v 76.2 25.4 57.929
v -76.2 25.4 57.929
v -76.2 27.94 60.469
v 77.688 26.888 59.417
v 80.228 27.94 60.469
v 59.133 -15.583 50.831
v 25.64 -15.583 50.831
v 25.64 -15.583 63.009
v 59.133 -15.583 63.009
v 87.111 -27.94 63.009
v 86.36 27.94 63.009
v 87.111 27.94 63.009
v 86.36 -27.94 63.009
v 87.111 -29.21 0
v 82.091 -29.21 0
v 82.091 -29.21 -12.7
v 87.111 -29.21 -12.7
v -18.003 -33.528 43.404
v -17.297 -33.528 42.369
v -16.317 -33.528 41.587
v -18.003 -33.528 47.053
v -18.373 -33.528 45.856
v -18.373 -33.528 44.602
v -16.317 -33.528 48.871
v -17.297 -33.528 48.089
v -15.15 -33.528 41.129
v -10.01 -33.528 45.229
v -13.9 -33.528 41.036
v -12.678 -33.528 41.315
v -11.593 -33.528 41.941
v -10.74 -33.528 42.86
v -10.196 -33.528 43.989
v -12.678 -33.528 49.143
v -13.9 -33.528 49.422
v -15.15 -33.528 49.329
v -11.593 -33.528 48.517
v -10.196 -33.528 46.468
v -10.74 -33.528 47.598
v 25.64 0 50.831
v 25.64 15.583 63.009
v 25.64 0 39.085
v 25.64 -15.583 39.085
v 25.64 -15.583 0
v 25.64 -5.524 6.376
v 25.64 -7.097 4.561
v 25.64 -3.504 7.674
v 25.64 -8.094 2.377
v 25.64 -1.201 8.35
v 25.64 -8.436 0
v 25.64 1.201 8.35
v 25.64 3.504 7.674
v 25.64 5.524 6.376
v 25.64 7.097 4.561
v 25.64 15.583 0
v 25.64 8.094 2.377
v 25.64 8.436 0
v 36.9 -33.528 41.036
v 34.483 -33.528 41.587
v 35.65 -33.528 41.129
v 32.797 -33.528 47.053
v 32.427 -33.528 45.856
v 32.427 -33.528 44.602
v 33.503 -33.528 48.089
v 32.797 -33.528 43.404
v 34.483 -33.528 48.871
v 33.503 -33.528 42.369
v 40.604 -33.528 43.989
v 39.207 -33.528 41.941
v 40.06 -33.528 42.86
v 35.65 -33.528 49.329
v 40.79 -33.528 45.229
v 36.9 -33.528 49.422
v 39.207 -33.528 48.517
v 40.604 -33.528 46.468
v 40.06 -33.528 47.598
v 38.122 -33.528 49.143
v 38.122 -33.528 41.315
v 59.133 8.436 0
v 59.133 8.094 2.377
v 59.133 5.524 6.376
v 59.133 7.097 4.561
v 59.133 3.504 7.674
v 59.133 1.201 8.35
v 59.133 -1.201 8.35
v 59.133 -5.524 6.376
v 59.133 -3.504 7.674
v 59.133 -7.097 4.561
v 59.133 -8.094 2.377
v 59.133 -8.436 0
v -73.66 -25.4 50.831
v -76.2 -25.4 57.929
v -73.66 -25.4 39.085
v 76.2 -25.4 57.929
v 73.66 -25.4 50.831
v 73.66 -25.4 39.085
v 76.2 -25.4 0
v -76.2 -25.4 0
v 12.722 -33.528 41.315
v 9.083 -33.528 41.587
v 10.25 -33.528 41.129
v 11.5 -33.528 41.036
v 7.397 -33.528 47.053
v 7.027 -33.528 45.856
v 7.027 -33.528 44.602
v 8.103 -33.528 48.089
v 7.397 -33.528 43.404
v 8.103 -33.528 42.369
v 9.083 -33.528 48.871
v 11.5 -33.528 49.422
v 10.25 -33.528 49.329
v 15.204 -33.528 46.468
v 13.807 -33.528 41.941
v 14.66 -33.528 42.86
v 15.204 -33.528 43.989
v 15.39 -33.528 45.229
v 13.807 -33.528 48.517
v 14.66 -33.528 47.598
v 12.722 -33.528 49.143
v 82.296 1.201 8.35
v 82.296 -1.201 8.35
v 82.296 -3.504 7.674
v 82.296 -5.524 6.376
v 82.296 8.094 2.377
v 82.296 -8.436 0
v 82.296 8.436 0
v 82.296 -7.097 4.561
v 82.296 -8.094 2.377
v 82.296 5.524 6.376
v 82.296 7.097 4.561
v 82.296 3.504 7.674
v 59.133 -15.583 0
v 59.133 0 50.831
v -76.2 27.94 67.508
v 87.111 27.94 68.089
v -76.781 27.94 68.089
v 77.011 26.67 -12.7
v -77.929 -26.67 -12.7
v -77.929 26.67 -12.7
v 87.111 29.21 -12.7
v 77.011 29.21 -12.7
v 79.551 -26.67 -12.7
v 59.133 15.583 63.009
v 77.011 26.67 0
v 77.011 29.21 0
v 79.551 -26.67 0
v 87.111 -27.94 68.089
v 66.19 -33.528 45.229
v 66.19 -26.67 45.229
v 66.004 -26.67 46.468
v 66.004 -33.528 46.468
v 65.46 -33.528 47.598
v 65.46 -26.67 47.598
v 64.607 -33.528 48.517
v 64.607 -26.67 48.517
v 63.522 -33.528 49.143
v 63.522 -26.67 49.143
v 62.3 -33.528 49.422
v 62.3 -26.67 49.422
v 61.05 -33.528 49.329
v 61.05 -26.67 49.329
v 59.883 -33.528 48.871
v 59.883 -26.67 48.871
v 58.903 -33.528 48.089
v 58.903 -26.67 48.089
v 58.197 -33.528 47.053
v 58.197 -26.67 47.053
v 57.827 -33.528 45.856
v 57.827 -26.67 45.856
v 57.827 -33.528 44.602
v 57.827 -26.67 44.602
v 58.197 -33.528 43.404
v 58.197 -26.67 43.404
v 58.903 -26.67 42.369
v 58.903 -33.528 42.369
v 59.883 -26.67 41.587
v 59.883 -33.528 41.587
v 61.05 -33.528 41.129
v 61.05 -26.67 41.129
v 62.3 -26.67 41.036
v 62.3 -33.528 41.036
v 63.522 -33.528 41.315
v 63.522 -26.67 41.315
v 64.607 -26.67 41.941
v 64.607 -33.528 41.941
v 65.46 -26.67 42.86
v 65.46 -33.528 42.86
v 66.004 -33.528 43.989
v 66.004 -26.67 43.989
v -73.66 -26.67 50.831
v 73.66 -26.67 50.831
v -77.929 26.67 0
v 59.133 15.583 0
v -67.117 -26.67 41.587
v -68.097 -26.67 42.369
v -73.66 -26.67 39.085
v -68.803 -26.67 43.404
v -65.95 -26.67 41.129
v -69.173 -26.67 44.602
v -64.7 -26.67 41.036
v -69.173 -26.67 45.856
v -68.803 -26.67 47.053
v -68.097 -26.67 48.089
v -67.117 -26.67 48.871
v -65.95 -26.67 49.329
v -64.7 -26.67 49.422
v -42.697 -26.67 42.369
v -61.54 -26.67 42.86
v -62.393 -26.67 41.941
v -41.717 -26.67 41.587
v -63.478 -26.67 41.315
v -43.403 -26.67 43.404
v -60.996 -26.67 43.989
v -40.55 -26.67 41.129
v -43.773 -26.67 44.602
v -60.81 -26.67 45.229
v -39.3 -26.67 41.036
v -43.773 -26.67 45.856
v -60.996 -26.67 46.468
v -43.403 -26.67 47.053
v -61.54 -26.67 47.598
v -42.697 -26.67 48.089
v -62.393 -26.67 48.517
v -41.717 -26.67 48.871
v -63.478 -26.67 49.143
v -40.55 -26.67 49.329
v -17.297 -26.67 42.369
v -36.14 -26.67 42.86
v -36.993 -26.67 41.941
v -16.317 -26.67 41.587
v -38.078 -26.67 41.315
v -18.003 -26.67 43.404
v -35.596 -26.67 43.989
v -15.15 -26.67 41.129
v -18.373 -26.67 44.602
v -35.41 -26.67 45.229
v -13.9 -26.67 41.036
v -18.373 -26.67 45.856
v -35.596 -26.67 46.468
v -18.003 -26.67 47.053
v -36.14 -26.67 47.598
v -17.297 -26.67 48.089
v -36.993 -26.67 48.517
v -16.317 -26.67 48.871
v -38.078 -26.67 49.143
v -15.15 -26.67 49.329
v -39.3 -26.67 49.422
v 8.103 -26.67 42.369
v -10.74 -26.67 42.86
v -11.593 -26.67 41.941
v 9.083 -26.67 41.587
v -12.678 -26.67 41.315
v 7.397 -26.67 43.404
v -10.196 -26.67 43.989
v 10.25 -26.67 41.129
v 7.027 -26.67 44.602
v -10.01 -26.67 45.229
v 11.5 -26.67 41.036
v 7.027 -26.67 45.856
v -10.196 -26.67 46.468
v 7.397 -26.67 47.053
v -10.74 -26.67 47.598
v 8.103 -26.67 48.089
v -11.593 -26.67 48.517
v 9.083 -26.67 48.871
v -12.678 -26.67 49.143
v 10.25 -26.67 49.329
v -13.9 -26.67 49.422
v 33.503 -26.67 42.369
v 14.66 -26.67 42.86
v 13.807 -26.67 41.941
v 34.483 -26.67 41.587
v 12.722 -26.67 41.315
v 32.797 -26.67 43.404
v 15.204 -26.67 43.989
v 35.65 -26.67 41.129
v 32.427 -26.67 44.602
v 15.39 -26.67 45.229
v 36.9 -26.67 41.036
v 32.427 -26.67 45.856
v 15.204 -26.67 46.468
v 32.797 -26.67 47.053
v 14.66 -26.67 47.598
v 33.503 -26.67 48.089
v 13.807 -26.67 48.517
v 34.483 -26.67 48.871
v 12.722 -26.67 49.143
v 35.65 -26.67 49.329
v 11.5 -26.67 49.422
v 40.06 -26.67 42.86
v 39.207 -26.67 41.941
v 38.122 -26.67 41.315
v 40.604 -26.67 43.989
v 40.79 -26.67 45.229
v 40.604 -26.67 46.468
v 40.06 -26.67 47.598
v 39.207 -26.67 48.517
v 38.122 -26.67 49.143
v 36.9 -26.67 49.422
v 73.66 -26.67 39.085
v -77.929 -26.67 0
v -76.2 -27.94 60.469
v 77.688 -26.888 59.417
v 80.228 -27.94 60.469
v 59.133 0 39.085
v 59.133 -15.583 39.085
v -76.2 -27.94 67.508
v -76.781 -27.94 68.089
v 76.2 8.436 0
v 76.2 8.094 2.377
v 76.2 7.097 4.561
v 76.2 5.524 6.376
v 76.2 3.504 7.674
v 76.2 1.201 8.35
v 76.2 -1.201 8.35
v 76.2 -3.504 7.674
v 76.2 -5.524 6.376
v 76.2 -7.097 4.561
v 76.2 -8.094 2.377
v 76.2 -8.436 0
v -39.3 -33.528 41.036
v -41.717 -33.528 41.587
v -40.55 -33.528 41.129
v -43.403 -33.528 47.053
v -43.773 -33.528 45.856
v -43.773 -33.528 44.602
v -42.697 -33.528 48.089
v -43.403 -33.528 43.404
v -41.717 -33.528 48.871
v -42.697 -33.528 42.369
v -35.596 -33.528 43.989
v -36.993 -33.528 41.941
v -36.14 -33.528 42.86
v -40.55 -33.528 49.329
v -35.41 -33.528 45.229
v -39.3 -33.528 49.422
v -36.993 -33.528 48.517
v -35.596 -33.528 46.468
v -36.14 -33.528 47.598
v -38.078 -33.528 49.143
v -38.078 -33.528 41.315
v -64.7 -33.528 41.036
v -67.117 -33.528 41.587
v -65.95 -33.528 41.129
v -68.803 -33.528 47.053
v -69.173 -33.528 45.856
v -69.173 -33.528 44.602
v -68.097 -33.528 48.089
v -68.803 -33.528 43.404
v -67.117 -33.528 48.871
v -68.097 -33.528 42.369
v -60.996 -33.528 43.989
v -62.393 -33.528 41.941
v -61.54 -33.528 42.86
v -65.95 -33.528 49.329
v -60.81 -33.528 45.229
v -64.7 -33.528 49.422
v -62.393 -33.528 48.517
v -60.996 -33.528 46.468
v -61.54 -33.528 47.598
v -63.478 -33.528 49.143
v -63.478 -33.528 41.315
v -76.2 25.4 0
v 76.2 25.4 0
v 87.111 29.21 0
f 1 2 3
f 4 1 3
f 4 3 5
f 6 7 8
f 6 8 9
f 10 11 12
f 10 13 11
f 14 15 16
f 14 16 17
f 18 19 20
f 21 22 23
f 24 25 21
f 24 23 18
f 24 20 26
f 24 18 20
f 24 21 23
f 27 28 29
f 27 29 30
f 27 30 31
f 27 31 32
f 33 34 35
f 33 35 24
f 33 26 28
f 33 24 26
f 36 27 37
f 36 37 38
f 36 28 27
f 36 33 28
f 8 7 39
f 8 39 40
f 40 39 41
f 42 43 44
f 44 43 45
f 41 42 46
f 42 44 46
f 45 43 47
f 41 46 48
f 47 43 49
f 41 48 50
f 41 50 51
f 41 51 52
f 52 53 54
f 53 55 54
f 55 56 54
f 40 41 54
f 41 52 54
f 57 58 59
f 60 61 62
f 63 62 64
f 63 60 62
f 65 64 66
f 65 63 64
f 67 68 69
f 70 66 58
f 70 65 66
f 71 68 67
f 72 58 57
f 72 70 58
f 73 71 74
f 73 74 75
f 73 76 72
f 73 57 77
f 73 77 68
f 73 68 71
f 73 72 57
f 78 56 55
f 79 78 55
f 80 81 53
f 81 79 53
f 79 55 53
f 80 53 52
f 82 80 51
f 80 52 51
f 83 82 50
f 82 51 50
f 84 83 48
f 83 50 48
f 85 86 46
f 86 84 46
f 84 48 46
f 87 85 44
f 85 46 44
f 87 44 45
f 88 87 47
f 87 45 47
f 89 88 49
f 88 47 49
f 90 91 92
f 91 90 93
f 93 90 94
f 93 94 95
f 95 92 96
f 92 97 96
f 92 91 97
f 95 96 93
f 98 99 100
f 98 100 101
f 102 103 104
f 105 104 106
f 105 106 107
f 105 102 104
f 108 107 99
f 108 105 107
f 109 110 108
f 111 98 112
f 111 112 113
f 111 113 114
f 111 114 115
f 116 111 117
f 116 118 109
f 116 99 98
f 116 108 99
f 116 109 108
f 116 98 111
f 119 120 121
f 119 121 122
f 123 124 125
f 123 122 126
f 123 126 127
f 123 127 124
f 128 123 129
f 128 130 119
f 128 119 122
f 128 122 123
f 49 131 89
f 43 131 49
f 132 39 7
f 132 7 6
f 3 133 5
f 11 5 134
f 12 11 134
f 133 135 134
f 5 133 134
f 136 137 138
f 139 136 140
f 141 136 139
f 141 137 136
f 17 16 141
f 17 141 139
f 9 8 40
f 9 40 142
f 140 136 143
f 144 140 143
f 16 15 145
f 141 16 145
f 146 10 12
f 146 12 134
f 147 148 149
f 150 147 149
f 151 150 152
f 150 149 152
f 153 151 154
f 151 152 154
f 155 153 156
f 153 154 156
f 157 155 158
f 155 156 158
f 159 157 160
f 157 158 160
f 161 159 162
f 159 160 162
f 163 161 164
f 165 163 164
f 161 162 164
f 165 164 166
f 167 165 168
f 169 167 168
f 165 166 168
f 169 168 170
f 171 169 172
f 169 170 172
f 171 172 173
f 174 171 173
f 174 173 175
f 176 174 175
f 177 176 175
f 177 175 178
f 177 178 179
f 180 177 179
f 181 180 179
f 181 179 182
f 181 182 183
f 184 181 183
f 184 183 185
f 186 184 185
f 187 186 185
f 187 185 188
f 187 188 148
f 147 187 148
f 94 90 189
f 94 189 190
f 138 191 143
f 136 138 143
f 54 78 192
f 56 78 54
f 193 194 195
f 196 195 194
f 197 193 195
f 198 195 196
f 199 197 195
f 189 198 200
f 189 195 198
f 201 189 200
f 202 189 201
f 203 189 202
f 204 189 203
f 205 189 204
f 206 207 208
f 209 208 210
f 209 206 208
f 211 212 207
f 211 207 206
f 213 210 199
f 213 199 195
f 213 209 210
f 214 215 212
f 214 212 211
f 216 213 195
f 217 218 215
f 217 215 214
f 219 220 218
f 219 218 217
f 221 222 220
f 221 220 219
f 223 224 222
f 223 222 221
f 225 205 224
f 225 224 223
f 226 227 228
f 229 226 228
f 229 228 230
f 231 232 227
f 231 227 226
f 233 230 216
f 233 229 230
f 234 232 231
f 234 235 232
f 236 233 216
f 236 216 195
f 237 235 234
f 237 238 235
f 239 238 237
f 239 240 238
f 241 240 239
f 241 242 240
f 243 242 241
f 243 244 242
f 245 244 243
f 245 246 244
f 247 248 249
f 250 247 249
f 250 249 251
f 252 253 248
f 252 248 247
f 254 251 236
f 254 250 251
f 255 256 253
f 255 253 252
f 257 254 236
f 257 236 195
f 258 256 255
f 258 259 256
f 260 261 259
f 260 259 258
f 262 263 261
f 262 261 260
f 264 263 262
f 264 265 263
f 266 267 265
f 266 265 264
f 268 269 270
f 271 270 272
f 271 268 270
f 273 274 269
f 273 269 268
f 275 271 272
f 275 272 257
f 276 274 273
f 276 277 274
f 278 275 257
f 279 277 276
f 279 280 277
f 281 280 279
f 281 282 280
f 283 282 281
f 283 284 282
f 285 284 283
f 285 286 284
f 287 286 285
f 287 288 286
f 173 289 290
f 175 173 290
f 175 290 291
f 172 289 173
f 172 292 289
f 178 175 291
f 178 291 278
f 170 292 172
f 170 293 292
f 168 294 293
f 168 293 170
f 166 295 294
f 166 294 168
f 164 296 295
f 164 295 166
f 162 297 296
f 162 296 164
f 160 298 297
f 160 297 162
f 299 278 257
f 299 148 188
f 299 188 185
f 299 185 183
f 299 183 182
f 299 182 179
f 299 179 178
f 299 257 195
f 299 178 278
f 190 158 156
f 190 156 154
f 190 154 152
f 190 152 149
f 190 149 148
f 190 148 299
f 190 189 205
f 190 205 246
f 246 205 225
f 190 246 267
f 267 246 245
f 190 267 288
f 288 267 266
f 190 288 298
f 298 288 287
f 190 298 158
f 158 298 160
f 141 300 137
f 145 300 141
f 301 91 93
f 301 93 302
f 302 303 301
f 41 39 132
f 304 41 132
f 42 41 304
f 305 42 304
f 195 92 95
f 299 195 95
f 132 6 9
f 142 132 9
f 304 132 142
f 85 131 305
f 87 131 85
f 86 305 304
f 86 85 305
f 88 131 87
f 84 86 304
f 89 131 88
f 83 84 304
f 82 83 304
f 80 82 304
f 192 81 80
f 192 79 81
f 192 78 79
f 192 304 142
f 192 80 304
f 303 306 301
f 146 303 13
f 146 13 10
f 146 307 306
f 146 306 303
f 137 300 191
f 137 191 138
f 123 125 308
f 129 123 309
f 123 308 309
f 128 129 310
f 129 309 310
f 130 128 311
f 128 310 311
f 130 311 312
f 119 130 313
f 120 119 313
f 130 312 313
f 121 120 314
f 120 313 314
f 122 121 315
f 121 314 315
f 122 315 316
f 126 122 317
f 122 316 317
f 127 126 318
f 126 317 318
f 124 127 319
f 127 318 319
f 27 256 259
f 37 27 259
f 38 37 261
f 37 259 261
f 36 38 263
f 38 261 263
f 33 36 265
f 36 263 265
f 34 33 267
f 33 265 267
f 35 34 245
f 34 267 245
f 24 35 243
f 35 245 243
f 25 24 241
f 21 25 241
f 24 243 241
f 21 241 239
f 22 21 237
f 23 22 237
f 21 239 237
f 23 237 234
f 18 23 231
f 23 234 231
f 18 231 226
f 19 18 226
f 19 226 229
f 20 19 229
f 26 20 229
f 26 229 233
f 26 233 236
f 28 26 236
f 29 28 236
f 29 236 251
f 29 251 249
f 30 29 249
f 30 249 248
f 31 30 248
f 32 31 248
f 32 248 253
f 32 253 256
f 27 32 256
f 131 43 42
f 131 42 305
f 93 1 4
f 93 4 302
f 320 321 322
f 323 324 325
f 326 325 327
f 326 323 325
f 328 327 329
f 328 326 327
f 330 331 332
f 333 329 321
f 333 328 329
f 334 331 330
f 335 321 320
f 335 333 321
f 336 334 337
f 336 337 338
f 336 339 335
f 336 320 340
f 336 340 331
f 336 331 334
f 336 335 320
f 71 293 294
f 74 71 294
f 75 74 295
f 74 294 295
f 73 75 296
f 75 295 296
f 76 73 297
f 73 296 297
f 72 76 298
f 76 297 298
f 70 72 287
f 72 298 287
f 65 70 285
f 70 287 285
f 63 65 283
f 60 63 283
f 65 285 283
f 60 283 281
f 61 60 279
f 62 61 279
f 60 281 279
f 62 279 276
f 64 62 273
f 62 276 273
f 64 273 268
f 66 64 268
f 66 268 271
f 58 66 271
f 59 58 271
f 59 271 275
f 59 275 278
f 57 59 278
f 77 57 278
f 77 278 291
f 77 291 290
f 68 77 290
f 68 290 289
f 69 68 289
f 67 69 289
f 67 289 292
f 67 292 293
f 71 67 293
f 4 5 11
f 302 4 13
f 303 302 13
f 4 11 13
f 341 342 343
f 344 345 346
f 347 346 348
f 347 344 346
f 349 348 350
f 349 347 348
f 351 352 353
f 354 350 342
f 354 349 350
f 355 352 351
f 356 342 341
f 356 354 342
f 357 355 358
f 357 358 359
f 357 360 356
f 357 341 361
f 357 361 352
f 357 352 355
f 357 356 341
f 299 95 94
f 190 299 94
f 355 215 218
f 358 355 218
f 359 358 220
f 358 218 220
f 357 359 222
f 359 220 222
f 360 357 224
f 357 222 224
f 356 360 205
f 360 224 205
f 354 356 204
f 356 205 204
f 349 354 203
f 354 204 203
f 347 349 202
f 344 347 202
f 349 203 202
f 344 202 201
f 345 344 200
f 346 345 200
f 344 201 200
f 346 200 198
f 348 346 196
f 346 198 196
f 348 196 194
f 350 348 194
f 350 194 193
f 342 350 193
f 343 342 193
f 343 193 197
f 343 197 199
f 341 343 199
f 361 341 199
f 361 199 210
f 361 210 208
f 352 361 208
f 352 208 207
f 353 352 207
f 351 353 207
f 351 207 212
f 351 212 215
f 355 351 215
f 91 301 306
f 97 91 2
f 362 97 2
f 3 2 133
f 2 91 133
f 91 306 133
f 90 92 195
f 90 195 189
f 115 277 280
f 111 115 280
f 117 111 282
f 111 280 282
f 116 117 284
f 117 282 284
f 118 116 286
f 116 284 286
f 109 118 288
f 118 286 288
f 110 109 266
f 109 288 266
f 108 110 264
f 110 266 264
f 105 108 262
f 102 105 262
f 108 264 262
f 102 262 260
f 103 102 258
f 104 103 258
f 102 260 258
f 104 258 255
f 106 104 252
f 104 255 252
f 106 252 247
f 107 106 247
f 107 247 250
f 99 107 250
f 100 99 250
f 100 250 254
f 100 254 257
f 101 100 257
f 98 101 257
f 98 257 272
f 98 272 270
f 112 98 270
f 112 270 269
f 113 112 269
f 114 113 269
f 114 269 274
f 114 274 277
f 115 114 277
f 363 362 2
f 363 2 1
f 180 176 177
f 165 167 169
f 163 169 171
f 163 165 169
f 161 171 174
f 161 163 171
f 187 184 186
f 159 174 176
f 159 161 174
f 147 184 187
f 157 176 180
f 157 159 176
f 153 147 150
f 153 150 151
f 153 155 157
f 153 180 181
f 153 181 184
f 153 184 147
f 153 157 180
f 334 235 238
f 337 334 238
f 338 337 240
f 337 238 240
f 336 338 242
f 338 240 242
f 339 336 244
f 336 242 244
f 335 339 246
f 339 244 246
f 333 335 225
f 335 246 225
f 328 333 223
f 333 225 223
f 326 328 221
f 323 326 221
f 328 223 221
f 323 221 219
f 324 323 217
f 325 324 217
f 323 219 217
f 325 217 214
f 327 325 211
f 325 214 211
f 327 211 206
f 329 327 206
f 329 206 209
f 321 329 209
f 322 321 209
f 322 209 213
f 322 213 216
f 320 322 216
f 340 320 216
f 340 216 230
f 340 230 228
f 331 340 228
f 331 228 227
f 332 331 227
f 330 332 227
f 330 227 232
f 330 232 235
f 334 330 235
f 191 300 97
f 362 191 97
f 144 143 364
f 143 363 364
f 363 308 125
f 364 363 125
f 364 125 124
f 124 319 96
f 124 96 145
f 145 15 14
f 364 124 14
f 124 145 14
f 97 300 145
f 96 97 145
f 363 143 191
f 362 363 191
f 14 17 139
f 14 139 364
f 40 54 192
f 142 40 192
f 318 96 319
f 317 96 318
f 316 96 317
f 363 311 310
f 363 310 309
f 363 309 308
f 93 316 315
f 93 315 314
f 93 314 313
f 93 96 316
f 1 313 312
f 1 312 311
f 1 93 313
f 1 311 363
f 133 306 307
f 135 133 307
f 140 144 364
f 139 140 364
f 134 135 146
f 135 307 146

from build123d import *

# Parameters (mm, degrees)
F0_W         = 152.4
F0_H         = 50.8
F0_W_2       = 33.4925577044
F0_H_2       = 31.1666876078
F1_DEPTH     = 63.5
F3_DEPTH     = 26.67
F2_W         = 163.8920905882
F2_H         = 5.08
F4_DEPTH     = 27.94
F2_W_2       = 10.0997969608
F2_H_2       = 12.7
F5_DEPTH     = 29.21
F6_T4_DEPTH  = 152.4
F6_T9_DEPTH  = 152.4
F6_T14_DEPTH = 38.8282991577
F7_T4_DEPTH  = 82.0082991577
F8_SIZE      = 5.08
F9_SIZE      = 5.08
F10_R        = 4.2050090424
F11_DEPTH    = 33.528
F12_W        = 147.32
F12_H        = 11.7464326172
F13_DEPTH    = 26.67
F14_R        = 8.4361197875
F15_DEPTH    = 82.296


# Not quite as in the source:
# - a fillet or chamfer that OpenCascade refuses, or shapes differently, is made with other operations: its cross-section is extruded or revolved along the edge and cut away or added


with BuildPart() as f1:
    # F0 (on Top) → F1 (new body)
    with BuildSketch(Plane.XY):
        Rectangle(F0_W, F0_H)
        with Locations((42.3862338066, 0)):
            Rectangle(F0_W_2, F0_H_2, mode=Mode.SUBTRACT)
    extrude(amount=F1_DEPTH)

    # F2 (on Front) → F3 (join, symmetric)
    with BuildSketch(Plane.XZ):
        Polygon((77.0109159804, 0), (-77.9290840196, 0), (-77.9290840196, -12.7), (4.4760434559, -12.7), (65.76342, -12.7), (77.0109159804, -12.7), align=None)
    extrude(amount=F3_DEPTH, both=True)

    # F2 (on Front) → F4 (join, symmetric)
    with BuildSketch(Plane.XZ):
        with Locations((5.1646676471, 65.5489305882)):
            Rectangle(F2_W, F2_H)
    extrude(amount=F4_DEPTH, both=True)

    # F2 (on Front) → F5 (join, symmetric)
    with BuildSketch(Plane.XZ):
        with Locations((82.0608144608, -6.35)):
            Rectangle(F2_W_2, F2_H_2)
    extrude(amount=F5_DEPTH, both=True)

    # F6: chamfer of 5.08 on 3 edges, made by hand


with BuildPart() as f6_tool2:
    # F6_s3 → F6_t4 (new body)
    with BuildSketch(Plane.YZ.offset(76.2)):
        Polygon((-25.4, 57.9289305882), (-30.48, 63.0089305882), (-25.4, 63.0089305882), align=None)
    extrude(amount=-F6_T4_DEPTH)

    split(bisect_by=Plane.XZ.offset(27.94), keep=Keep.BOTTOM)


with BuildPart() as f1_1:
    add(f1.part)

    # F6_t1: union F6_tool2
    add(f6_tool2.part)


with BuildPart() as f6_tool7:
    # F6_s8 → F6_t9 (new body)
    with BuildSketch(Plane.YZ.offset(-76.2)):
        Polygon((25.4, 57.9289305882), (30.48, 63.0089305882), (25.4, 63.0089305882), align=None)
    extrude(amount=F6_T9_DEPTH)

    split(bisect_by=Plane.XZ.offset(-27.94), keep=Keep.TOP)


with BuildPart() as f1_2:
    add(f1_1.part)

    # F6_t6: union F6_tool7
    add(f6_tool7.part)


with BuildPart() as f6_tool12:
    # F6_s13 → F6_t14 (new body)
    with BuildSketch(Plane.XY.offset(13.0641495789)):
        Polygon((82.0909159804, -29.21), (77.0109159804, -24.13), (77.0109159804, -29.21), align=None)
    extrude(amount=-F6_T14_DEPTH)

    split(bisect_by=Plane.XZ.offset(26.67), keep=Keep.TOP)


with BuildPart() as f1_3:
    add(f1_2.part)

    # F6_t11: cut F6_tool12
    add(f6_tool12.part, mode=Mode.SUBTRACT)

    # F7: chamfer of 5.08 on 1 edges, made by hand


with BuildPart() as f7_tool2:
    # F7_s3 → F7_t4 (new body)
    with BuildSketch(Plane.XZ.offset(-41.0041495789)):
        Polygon((-71.7013776471, 63.0089305882), (-76.7813776471, 68.0889305882), (-76.7813776471, 63.0089305882), align=None)
    extrude(amount=F7_T4_DEPTH)

    split(bisect_by=Plane.YZ.offset(-76.2), keep=Keep.BOTTOM)


with BuildPart() as f1_4:
    add(f1_3.part)

    # F7_t1: cut F7_tool2
    add(f7_tool2.part, mode=Mode.SUBTRACT)

    # F8
    f8_edges = [f1_4.edges().sort_by_distance(p)[0] for p in [
        (76.2, 0, 63.008931),
    ]]
    chamfer(f8_edges, length=F8_SIZE)

    # F9
    f9_edges = [f1_4.edges().sort_by_distance(p)[0] for p in [
        (81.28, 0, 63.008931),
    ]]
    chamfer(f9_edges, length=F9_SIZE)

    # F10 (on Front) → F11 (join)
    with BuildSketch(Plane.XZ):
        with Locations((-65.0145885289, 45.2289305882)):
            Circle(F10_R)
        with Locations((-39.6145885289, 45.2289305882)):
            Circle(F10_R)
        with Locations((-14.2145885289, 45.2289305882)):
            Circle(F10_R)
        with Locations((11.1854114711, 45.2289305882)):
            Circle(F10_R)
        with Locations((36.5854114711, 45.2289305882)):
            Circle(F10_R)
        with Locations((61.9854114711, 45.2289305882)):
            Circle(F10_R)
    extrude(amount=F11_DEPTH)

    # F12 (on Front) → F13 (join)
    with BuildSketch(Plane.XZ):
        with Locations((0, 44.957723322)):
            Rectangle(F12_W, F12_H)
    extrude(amount=F13_DEPTH)

    # F14 (on Right) → F15 (join)
    with BuildSketch(Plane.YZ):
        Circle(F14_R)
    extrude(amount=F15_DEPTH)


solid = f1_4.part
